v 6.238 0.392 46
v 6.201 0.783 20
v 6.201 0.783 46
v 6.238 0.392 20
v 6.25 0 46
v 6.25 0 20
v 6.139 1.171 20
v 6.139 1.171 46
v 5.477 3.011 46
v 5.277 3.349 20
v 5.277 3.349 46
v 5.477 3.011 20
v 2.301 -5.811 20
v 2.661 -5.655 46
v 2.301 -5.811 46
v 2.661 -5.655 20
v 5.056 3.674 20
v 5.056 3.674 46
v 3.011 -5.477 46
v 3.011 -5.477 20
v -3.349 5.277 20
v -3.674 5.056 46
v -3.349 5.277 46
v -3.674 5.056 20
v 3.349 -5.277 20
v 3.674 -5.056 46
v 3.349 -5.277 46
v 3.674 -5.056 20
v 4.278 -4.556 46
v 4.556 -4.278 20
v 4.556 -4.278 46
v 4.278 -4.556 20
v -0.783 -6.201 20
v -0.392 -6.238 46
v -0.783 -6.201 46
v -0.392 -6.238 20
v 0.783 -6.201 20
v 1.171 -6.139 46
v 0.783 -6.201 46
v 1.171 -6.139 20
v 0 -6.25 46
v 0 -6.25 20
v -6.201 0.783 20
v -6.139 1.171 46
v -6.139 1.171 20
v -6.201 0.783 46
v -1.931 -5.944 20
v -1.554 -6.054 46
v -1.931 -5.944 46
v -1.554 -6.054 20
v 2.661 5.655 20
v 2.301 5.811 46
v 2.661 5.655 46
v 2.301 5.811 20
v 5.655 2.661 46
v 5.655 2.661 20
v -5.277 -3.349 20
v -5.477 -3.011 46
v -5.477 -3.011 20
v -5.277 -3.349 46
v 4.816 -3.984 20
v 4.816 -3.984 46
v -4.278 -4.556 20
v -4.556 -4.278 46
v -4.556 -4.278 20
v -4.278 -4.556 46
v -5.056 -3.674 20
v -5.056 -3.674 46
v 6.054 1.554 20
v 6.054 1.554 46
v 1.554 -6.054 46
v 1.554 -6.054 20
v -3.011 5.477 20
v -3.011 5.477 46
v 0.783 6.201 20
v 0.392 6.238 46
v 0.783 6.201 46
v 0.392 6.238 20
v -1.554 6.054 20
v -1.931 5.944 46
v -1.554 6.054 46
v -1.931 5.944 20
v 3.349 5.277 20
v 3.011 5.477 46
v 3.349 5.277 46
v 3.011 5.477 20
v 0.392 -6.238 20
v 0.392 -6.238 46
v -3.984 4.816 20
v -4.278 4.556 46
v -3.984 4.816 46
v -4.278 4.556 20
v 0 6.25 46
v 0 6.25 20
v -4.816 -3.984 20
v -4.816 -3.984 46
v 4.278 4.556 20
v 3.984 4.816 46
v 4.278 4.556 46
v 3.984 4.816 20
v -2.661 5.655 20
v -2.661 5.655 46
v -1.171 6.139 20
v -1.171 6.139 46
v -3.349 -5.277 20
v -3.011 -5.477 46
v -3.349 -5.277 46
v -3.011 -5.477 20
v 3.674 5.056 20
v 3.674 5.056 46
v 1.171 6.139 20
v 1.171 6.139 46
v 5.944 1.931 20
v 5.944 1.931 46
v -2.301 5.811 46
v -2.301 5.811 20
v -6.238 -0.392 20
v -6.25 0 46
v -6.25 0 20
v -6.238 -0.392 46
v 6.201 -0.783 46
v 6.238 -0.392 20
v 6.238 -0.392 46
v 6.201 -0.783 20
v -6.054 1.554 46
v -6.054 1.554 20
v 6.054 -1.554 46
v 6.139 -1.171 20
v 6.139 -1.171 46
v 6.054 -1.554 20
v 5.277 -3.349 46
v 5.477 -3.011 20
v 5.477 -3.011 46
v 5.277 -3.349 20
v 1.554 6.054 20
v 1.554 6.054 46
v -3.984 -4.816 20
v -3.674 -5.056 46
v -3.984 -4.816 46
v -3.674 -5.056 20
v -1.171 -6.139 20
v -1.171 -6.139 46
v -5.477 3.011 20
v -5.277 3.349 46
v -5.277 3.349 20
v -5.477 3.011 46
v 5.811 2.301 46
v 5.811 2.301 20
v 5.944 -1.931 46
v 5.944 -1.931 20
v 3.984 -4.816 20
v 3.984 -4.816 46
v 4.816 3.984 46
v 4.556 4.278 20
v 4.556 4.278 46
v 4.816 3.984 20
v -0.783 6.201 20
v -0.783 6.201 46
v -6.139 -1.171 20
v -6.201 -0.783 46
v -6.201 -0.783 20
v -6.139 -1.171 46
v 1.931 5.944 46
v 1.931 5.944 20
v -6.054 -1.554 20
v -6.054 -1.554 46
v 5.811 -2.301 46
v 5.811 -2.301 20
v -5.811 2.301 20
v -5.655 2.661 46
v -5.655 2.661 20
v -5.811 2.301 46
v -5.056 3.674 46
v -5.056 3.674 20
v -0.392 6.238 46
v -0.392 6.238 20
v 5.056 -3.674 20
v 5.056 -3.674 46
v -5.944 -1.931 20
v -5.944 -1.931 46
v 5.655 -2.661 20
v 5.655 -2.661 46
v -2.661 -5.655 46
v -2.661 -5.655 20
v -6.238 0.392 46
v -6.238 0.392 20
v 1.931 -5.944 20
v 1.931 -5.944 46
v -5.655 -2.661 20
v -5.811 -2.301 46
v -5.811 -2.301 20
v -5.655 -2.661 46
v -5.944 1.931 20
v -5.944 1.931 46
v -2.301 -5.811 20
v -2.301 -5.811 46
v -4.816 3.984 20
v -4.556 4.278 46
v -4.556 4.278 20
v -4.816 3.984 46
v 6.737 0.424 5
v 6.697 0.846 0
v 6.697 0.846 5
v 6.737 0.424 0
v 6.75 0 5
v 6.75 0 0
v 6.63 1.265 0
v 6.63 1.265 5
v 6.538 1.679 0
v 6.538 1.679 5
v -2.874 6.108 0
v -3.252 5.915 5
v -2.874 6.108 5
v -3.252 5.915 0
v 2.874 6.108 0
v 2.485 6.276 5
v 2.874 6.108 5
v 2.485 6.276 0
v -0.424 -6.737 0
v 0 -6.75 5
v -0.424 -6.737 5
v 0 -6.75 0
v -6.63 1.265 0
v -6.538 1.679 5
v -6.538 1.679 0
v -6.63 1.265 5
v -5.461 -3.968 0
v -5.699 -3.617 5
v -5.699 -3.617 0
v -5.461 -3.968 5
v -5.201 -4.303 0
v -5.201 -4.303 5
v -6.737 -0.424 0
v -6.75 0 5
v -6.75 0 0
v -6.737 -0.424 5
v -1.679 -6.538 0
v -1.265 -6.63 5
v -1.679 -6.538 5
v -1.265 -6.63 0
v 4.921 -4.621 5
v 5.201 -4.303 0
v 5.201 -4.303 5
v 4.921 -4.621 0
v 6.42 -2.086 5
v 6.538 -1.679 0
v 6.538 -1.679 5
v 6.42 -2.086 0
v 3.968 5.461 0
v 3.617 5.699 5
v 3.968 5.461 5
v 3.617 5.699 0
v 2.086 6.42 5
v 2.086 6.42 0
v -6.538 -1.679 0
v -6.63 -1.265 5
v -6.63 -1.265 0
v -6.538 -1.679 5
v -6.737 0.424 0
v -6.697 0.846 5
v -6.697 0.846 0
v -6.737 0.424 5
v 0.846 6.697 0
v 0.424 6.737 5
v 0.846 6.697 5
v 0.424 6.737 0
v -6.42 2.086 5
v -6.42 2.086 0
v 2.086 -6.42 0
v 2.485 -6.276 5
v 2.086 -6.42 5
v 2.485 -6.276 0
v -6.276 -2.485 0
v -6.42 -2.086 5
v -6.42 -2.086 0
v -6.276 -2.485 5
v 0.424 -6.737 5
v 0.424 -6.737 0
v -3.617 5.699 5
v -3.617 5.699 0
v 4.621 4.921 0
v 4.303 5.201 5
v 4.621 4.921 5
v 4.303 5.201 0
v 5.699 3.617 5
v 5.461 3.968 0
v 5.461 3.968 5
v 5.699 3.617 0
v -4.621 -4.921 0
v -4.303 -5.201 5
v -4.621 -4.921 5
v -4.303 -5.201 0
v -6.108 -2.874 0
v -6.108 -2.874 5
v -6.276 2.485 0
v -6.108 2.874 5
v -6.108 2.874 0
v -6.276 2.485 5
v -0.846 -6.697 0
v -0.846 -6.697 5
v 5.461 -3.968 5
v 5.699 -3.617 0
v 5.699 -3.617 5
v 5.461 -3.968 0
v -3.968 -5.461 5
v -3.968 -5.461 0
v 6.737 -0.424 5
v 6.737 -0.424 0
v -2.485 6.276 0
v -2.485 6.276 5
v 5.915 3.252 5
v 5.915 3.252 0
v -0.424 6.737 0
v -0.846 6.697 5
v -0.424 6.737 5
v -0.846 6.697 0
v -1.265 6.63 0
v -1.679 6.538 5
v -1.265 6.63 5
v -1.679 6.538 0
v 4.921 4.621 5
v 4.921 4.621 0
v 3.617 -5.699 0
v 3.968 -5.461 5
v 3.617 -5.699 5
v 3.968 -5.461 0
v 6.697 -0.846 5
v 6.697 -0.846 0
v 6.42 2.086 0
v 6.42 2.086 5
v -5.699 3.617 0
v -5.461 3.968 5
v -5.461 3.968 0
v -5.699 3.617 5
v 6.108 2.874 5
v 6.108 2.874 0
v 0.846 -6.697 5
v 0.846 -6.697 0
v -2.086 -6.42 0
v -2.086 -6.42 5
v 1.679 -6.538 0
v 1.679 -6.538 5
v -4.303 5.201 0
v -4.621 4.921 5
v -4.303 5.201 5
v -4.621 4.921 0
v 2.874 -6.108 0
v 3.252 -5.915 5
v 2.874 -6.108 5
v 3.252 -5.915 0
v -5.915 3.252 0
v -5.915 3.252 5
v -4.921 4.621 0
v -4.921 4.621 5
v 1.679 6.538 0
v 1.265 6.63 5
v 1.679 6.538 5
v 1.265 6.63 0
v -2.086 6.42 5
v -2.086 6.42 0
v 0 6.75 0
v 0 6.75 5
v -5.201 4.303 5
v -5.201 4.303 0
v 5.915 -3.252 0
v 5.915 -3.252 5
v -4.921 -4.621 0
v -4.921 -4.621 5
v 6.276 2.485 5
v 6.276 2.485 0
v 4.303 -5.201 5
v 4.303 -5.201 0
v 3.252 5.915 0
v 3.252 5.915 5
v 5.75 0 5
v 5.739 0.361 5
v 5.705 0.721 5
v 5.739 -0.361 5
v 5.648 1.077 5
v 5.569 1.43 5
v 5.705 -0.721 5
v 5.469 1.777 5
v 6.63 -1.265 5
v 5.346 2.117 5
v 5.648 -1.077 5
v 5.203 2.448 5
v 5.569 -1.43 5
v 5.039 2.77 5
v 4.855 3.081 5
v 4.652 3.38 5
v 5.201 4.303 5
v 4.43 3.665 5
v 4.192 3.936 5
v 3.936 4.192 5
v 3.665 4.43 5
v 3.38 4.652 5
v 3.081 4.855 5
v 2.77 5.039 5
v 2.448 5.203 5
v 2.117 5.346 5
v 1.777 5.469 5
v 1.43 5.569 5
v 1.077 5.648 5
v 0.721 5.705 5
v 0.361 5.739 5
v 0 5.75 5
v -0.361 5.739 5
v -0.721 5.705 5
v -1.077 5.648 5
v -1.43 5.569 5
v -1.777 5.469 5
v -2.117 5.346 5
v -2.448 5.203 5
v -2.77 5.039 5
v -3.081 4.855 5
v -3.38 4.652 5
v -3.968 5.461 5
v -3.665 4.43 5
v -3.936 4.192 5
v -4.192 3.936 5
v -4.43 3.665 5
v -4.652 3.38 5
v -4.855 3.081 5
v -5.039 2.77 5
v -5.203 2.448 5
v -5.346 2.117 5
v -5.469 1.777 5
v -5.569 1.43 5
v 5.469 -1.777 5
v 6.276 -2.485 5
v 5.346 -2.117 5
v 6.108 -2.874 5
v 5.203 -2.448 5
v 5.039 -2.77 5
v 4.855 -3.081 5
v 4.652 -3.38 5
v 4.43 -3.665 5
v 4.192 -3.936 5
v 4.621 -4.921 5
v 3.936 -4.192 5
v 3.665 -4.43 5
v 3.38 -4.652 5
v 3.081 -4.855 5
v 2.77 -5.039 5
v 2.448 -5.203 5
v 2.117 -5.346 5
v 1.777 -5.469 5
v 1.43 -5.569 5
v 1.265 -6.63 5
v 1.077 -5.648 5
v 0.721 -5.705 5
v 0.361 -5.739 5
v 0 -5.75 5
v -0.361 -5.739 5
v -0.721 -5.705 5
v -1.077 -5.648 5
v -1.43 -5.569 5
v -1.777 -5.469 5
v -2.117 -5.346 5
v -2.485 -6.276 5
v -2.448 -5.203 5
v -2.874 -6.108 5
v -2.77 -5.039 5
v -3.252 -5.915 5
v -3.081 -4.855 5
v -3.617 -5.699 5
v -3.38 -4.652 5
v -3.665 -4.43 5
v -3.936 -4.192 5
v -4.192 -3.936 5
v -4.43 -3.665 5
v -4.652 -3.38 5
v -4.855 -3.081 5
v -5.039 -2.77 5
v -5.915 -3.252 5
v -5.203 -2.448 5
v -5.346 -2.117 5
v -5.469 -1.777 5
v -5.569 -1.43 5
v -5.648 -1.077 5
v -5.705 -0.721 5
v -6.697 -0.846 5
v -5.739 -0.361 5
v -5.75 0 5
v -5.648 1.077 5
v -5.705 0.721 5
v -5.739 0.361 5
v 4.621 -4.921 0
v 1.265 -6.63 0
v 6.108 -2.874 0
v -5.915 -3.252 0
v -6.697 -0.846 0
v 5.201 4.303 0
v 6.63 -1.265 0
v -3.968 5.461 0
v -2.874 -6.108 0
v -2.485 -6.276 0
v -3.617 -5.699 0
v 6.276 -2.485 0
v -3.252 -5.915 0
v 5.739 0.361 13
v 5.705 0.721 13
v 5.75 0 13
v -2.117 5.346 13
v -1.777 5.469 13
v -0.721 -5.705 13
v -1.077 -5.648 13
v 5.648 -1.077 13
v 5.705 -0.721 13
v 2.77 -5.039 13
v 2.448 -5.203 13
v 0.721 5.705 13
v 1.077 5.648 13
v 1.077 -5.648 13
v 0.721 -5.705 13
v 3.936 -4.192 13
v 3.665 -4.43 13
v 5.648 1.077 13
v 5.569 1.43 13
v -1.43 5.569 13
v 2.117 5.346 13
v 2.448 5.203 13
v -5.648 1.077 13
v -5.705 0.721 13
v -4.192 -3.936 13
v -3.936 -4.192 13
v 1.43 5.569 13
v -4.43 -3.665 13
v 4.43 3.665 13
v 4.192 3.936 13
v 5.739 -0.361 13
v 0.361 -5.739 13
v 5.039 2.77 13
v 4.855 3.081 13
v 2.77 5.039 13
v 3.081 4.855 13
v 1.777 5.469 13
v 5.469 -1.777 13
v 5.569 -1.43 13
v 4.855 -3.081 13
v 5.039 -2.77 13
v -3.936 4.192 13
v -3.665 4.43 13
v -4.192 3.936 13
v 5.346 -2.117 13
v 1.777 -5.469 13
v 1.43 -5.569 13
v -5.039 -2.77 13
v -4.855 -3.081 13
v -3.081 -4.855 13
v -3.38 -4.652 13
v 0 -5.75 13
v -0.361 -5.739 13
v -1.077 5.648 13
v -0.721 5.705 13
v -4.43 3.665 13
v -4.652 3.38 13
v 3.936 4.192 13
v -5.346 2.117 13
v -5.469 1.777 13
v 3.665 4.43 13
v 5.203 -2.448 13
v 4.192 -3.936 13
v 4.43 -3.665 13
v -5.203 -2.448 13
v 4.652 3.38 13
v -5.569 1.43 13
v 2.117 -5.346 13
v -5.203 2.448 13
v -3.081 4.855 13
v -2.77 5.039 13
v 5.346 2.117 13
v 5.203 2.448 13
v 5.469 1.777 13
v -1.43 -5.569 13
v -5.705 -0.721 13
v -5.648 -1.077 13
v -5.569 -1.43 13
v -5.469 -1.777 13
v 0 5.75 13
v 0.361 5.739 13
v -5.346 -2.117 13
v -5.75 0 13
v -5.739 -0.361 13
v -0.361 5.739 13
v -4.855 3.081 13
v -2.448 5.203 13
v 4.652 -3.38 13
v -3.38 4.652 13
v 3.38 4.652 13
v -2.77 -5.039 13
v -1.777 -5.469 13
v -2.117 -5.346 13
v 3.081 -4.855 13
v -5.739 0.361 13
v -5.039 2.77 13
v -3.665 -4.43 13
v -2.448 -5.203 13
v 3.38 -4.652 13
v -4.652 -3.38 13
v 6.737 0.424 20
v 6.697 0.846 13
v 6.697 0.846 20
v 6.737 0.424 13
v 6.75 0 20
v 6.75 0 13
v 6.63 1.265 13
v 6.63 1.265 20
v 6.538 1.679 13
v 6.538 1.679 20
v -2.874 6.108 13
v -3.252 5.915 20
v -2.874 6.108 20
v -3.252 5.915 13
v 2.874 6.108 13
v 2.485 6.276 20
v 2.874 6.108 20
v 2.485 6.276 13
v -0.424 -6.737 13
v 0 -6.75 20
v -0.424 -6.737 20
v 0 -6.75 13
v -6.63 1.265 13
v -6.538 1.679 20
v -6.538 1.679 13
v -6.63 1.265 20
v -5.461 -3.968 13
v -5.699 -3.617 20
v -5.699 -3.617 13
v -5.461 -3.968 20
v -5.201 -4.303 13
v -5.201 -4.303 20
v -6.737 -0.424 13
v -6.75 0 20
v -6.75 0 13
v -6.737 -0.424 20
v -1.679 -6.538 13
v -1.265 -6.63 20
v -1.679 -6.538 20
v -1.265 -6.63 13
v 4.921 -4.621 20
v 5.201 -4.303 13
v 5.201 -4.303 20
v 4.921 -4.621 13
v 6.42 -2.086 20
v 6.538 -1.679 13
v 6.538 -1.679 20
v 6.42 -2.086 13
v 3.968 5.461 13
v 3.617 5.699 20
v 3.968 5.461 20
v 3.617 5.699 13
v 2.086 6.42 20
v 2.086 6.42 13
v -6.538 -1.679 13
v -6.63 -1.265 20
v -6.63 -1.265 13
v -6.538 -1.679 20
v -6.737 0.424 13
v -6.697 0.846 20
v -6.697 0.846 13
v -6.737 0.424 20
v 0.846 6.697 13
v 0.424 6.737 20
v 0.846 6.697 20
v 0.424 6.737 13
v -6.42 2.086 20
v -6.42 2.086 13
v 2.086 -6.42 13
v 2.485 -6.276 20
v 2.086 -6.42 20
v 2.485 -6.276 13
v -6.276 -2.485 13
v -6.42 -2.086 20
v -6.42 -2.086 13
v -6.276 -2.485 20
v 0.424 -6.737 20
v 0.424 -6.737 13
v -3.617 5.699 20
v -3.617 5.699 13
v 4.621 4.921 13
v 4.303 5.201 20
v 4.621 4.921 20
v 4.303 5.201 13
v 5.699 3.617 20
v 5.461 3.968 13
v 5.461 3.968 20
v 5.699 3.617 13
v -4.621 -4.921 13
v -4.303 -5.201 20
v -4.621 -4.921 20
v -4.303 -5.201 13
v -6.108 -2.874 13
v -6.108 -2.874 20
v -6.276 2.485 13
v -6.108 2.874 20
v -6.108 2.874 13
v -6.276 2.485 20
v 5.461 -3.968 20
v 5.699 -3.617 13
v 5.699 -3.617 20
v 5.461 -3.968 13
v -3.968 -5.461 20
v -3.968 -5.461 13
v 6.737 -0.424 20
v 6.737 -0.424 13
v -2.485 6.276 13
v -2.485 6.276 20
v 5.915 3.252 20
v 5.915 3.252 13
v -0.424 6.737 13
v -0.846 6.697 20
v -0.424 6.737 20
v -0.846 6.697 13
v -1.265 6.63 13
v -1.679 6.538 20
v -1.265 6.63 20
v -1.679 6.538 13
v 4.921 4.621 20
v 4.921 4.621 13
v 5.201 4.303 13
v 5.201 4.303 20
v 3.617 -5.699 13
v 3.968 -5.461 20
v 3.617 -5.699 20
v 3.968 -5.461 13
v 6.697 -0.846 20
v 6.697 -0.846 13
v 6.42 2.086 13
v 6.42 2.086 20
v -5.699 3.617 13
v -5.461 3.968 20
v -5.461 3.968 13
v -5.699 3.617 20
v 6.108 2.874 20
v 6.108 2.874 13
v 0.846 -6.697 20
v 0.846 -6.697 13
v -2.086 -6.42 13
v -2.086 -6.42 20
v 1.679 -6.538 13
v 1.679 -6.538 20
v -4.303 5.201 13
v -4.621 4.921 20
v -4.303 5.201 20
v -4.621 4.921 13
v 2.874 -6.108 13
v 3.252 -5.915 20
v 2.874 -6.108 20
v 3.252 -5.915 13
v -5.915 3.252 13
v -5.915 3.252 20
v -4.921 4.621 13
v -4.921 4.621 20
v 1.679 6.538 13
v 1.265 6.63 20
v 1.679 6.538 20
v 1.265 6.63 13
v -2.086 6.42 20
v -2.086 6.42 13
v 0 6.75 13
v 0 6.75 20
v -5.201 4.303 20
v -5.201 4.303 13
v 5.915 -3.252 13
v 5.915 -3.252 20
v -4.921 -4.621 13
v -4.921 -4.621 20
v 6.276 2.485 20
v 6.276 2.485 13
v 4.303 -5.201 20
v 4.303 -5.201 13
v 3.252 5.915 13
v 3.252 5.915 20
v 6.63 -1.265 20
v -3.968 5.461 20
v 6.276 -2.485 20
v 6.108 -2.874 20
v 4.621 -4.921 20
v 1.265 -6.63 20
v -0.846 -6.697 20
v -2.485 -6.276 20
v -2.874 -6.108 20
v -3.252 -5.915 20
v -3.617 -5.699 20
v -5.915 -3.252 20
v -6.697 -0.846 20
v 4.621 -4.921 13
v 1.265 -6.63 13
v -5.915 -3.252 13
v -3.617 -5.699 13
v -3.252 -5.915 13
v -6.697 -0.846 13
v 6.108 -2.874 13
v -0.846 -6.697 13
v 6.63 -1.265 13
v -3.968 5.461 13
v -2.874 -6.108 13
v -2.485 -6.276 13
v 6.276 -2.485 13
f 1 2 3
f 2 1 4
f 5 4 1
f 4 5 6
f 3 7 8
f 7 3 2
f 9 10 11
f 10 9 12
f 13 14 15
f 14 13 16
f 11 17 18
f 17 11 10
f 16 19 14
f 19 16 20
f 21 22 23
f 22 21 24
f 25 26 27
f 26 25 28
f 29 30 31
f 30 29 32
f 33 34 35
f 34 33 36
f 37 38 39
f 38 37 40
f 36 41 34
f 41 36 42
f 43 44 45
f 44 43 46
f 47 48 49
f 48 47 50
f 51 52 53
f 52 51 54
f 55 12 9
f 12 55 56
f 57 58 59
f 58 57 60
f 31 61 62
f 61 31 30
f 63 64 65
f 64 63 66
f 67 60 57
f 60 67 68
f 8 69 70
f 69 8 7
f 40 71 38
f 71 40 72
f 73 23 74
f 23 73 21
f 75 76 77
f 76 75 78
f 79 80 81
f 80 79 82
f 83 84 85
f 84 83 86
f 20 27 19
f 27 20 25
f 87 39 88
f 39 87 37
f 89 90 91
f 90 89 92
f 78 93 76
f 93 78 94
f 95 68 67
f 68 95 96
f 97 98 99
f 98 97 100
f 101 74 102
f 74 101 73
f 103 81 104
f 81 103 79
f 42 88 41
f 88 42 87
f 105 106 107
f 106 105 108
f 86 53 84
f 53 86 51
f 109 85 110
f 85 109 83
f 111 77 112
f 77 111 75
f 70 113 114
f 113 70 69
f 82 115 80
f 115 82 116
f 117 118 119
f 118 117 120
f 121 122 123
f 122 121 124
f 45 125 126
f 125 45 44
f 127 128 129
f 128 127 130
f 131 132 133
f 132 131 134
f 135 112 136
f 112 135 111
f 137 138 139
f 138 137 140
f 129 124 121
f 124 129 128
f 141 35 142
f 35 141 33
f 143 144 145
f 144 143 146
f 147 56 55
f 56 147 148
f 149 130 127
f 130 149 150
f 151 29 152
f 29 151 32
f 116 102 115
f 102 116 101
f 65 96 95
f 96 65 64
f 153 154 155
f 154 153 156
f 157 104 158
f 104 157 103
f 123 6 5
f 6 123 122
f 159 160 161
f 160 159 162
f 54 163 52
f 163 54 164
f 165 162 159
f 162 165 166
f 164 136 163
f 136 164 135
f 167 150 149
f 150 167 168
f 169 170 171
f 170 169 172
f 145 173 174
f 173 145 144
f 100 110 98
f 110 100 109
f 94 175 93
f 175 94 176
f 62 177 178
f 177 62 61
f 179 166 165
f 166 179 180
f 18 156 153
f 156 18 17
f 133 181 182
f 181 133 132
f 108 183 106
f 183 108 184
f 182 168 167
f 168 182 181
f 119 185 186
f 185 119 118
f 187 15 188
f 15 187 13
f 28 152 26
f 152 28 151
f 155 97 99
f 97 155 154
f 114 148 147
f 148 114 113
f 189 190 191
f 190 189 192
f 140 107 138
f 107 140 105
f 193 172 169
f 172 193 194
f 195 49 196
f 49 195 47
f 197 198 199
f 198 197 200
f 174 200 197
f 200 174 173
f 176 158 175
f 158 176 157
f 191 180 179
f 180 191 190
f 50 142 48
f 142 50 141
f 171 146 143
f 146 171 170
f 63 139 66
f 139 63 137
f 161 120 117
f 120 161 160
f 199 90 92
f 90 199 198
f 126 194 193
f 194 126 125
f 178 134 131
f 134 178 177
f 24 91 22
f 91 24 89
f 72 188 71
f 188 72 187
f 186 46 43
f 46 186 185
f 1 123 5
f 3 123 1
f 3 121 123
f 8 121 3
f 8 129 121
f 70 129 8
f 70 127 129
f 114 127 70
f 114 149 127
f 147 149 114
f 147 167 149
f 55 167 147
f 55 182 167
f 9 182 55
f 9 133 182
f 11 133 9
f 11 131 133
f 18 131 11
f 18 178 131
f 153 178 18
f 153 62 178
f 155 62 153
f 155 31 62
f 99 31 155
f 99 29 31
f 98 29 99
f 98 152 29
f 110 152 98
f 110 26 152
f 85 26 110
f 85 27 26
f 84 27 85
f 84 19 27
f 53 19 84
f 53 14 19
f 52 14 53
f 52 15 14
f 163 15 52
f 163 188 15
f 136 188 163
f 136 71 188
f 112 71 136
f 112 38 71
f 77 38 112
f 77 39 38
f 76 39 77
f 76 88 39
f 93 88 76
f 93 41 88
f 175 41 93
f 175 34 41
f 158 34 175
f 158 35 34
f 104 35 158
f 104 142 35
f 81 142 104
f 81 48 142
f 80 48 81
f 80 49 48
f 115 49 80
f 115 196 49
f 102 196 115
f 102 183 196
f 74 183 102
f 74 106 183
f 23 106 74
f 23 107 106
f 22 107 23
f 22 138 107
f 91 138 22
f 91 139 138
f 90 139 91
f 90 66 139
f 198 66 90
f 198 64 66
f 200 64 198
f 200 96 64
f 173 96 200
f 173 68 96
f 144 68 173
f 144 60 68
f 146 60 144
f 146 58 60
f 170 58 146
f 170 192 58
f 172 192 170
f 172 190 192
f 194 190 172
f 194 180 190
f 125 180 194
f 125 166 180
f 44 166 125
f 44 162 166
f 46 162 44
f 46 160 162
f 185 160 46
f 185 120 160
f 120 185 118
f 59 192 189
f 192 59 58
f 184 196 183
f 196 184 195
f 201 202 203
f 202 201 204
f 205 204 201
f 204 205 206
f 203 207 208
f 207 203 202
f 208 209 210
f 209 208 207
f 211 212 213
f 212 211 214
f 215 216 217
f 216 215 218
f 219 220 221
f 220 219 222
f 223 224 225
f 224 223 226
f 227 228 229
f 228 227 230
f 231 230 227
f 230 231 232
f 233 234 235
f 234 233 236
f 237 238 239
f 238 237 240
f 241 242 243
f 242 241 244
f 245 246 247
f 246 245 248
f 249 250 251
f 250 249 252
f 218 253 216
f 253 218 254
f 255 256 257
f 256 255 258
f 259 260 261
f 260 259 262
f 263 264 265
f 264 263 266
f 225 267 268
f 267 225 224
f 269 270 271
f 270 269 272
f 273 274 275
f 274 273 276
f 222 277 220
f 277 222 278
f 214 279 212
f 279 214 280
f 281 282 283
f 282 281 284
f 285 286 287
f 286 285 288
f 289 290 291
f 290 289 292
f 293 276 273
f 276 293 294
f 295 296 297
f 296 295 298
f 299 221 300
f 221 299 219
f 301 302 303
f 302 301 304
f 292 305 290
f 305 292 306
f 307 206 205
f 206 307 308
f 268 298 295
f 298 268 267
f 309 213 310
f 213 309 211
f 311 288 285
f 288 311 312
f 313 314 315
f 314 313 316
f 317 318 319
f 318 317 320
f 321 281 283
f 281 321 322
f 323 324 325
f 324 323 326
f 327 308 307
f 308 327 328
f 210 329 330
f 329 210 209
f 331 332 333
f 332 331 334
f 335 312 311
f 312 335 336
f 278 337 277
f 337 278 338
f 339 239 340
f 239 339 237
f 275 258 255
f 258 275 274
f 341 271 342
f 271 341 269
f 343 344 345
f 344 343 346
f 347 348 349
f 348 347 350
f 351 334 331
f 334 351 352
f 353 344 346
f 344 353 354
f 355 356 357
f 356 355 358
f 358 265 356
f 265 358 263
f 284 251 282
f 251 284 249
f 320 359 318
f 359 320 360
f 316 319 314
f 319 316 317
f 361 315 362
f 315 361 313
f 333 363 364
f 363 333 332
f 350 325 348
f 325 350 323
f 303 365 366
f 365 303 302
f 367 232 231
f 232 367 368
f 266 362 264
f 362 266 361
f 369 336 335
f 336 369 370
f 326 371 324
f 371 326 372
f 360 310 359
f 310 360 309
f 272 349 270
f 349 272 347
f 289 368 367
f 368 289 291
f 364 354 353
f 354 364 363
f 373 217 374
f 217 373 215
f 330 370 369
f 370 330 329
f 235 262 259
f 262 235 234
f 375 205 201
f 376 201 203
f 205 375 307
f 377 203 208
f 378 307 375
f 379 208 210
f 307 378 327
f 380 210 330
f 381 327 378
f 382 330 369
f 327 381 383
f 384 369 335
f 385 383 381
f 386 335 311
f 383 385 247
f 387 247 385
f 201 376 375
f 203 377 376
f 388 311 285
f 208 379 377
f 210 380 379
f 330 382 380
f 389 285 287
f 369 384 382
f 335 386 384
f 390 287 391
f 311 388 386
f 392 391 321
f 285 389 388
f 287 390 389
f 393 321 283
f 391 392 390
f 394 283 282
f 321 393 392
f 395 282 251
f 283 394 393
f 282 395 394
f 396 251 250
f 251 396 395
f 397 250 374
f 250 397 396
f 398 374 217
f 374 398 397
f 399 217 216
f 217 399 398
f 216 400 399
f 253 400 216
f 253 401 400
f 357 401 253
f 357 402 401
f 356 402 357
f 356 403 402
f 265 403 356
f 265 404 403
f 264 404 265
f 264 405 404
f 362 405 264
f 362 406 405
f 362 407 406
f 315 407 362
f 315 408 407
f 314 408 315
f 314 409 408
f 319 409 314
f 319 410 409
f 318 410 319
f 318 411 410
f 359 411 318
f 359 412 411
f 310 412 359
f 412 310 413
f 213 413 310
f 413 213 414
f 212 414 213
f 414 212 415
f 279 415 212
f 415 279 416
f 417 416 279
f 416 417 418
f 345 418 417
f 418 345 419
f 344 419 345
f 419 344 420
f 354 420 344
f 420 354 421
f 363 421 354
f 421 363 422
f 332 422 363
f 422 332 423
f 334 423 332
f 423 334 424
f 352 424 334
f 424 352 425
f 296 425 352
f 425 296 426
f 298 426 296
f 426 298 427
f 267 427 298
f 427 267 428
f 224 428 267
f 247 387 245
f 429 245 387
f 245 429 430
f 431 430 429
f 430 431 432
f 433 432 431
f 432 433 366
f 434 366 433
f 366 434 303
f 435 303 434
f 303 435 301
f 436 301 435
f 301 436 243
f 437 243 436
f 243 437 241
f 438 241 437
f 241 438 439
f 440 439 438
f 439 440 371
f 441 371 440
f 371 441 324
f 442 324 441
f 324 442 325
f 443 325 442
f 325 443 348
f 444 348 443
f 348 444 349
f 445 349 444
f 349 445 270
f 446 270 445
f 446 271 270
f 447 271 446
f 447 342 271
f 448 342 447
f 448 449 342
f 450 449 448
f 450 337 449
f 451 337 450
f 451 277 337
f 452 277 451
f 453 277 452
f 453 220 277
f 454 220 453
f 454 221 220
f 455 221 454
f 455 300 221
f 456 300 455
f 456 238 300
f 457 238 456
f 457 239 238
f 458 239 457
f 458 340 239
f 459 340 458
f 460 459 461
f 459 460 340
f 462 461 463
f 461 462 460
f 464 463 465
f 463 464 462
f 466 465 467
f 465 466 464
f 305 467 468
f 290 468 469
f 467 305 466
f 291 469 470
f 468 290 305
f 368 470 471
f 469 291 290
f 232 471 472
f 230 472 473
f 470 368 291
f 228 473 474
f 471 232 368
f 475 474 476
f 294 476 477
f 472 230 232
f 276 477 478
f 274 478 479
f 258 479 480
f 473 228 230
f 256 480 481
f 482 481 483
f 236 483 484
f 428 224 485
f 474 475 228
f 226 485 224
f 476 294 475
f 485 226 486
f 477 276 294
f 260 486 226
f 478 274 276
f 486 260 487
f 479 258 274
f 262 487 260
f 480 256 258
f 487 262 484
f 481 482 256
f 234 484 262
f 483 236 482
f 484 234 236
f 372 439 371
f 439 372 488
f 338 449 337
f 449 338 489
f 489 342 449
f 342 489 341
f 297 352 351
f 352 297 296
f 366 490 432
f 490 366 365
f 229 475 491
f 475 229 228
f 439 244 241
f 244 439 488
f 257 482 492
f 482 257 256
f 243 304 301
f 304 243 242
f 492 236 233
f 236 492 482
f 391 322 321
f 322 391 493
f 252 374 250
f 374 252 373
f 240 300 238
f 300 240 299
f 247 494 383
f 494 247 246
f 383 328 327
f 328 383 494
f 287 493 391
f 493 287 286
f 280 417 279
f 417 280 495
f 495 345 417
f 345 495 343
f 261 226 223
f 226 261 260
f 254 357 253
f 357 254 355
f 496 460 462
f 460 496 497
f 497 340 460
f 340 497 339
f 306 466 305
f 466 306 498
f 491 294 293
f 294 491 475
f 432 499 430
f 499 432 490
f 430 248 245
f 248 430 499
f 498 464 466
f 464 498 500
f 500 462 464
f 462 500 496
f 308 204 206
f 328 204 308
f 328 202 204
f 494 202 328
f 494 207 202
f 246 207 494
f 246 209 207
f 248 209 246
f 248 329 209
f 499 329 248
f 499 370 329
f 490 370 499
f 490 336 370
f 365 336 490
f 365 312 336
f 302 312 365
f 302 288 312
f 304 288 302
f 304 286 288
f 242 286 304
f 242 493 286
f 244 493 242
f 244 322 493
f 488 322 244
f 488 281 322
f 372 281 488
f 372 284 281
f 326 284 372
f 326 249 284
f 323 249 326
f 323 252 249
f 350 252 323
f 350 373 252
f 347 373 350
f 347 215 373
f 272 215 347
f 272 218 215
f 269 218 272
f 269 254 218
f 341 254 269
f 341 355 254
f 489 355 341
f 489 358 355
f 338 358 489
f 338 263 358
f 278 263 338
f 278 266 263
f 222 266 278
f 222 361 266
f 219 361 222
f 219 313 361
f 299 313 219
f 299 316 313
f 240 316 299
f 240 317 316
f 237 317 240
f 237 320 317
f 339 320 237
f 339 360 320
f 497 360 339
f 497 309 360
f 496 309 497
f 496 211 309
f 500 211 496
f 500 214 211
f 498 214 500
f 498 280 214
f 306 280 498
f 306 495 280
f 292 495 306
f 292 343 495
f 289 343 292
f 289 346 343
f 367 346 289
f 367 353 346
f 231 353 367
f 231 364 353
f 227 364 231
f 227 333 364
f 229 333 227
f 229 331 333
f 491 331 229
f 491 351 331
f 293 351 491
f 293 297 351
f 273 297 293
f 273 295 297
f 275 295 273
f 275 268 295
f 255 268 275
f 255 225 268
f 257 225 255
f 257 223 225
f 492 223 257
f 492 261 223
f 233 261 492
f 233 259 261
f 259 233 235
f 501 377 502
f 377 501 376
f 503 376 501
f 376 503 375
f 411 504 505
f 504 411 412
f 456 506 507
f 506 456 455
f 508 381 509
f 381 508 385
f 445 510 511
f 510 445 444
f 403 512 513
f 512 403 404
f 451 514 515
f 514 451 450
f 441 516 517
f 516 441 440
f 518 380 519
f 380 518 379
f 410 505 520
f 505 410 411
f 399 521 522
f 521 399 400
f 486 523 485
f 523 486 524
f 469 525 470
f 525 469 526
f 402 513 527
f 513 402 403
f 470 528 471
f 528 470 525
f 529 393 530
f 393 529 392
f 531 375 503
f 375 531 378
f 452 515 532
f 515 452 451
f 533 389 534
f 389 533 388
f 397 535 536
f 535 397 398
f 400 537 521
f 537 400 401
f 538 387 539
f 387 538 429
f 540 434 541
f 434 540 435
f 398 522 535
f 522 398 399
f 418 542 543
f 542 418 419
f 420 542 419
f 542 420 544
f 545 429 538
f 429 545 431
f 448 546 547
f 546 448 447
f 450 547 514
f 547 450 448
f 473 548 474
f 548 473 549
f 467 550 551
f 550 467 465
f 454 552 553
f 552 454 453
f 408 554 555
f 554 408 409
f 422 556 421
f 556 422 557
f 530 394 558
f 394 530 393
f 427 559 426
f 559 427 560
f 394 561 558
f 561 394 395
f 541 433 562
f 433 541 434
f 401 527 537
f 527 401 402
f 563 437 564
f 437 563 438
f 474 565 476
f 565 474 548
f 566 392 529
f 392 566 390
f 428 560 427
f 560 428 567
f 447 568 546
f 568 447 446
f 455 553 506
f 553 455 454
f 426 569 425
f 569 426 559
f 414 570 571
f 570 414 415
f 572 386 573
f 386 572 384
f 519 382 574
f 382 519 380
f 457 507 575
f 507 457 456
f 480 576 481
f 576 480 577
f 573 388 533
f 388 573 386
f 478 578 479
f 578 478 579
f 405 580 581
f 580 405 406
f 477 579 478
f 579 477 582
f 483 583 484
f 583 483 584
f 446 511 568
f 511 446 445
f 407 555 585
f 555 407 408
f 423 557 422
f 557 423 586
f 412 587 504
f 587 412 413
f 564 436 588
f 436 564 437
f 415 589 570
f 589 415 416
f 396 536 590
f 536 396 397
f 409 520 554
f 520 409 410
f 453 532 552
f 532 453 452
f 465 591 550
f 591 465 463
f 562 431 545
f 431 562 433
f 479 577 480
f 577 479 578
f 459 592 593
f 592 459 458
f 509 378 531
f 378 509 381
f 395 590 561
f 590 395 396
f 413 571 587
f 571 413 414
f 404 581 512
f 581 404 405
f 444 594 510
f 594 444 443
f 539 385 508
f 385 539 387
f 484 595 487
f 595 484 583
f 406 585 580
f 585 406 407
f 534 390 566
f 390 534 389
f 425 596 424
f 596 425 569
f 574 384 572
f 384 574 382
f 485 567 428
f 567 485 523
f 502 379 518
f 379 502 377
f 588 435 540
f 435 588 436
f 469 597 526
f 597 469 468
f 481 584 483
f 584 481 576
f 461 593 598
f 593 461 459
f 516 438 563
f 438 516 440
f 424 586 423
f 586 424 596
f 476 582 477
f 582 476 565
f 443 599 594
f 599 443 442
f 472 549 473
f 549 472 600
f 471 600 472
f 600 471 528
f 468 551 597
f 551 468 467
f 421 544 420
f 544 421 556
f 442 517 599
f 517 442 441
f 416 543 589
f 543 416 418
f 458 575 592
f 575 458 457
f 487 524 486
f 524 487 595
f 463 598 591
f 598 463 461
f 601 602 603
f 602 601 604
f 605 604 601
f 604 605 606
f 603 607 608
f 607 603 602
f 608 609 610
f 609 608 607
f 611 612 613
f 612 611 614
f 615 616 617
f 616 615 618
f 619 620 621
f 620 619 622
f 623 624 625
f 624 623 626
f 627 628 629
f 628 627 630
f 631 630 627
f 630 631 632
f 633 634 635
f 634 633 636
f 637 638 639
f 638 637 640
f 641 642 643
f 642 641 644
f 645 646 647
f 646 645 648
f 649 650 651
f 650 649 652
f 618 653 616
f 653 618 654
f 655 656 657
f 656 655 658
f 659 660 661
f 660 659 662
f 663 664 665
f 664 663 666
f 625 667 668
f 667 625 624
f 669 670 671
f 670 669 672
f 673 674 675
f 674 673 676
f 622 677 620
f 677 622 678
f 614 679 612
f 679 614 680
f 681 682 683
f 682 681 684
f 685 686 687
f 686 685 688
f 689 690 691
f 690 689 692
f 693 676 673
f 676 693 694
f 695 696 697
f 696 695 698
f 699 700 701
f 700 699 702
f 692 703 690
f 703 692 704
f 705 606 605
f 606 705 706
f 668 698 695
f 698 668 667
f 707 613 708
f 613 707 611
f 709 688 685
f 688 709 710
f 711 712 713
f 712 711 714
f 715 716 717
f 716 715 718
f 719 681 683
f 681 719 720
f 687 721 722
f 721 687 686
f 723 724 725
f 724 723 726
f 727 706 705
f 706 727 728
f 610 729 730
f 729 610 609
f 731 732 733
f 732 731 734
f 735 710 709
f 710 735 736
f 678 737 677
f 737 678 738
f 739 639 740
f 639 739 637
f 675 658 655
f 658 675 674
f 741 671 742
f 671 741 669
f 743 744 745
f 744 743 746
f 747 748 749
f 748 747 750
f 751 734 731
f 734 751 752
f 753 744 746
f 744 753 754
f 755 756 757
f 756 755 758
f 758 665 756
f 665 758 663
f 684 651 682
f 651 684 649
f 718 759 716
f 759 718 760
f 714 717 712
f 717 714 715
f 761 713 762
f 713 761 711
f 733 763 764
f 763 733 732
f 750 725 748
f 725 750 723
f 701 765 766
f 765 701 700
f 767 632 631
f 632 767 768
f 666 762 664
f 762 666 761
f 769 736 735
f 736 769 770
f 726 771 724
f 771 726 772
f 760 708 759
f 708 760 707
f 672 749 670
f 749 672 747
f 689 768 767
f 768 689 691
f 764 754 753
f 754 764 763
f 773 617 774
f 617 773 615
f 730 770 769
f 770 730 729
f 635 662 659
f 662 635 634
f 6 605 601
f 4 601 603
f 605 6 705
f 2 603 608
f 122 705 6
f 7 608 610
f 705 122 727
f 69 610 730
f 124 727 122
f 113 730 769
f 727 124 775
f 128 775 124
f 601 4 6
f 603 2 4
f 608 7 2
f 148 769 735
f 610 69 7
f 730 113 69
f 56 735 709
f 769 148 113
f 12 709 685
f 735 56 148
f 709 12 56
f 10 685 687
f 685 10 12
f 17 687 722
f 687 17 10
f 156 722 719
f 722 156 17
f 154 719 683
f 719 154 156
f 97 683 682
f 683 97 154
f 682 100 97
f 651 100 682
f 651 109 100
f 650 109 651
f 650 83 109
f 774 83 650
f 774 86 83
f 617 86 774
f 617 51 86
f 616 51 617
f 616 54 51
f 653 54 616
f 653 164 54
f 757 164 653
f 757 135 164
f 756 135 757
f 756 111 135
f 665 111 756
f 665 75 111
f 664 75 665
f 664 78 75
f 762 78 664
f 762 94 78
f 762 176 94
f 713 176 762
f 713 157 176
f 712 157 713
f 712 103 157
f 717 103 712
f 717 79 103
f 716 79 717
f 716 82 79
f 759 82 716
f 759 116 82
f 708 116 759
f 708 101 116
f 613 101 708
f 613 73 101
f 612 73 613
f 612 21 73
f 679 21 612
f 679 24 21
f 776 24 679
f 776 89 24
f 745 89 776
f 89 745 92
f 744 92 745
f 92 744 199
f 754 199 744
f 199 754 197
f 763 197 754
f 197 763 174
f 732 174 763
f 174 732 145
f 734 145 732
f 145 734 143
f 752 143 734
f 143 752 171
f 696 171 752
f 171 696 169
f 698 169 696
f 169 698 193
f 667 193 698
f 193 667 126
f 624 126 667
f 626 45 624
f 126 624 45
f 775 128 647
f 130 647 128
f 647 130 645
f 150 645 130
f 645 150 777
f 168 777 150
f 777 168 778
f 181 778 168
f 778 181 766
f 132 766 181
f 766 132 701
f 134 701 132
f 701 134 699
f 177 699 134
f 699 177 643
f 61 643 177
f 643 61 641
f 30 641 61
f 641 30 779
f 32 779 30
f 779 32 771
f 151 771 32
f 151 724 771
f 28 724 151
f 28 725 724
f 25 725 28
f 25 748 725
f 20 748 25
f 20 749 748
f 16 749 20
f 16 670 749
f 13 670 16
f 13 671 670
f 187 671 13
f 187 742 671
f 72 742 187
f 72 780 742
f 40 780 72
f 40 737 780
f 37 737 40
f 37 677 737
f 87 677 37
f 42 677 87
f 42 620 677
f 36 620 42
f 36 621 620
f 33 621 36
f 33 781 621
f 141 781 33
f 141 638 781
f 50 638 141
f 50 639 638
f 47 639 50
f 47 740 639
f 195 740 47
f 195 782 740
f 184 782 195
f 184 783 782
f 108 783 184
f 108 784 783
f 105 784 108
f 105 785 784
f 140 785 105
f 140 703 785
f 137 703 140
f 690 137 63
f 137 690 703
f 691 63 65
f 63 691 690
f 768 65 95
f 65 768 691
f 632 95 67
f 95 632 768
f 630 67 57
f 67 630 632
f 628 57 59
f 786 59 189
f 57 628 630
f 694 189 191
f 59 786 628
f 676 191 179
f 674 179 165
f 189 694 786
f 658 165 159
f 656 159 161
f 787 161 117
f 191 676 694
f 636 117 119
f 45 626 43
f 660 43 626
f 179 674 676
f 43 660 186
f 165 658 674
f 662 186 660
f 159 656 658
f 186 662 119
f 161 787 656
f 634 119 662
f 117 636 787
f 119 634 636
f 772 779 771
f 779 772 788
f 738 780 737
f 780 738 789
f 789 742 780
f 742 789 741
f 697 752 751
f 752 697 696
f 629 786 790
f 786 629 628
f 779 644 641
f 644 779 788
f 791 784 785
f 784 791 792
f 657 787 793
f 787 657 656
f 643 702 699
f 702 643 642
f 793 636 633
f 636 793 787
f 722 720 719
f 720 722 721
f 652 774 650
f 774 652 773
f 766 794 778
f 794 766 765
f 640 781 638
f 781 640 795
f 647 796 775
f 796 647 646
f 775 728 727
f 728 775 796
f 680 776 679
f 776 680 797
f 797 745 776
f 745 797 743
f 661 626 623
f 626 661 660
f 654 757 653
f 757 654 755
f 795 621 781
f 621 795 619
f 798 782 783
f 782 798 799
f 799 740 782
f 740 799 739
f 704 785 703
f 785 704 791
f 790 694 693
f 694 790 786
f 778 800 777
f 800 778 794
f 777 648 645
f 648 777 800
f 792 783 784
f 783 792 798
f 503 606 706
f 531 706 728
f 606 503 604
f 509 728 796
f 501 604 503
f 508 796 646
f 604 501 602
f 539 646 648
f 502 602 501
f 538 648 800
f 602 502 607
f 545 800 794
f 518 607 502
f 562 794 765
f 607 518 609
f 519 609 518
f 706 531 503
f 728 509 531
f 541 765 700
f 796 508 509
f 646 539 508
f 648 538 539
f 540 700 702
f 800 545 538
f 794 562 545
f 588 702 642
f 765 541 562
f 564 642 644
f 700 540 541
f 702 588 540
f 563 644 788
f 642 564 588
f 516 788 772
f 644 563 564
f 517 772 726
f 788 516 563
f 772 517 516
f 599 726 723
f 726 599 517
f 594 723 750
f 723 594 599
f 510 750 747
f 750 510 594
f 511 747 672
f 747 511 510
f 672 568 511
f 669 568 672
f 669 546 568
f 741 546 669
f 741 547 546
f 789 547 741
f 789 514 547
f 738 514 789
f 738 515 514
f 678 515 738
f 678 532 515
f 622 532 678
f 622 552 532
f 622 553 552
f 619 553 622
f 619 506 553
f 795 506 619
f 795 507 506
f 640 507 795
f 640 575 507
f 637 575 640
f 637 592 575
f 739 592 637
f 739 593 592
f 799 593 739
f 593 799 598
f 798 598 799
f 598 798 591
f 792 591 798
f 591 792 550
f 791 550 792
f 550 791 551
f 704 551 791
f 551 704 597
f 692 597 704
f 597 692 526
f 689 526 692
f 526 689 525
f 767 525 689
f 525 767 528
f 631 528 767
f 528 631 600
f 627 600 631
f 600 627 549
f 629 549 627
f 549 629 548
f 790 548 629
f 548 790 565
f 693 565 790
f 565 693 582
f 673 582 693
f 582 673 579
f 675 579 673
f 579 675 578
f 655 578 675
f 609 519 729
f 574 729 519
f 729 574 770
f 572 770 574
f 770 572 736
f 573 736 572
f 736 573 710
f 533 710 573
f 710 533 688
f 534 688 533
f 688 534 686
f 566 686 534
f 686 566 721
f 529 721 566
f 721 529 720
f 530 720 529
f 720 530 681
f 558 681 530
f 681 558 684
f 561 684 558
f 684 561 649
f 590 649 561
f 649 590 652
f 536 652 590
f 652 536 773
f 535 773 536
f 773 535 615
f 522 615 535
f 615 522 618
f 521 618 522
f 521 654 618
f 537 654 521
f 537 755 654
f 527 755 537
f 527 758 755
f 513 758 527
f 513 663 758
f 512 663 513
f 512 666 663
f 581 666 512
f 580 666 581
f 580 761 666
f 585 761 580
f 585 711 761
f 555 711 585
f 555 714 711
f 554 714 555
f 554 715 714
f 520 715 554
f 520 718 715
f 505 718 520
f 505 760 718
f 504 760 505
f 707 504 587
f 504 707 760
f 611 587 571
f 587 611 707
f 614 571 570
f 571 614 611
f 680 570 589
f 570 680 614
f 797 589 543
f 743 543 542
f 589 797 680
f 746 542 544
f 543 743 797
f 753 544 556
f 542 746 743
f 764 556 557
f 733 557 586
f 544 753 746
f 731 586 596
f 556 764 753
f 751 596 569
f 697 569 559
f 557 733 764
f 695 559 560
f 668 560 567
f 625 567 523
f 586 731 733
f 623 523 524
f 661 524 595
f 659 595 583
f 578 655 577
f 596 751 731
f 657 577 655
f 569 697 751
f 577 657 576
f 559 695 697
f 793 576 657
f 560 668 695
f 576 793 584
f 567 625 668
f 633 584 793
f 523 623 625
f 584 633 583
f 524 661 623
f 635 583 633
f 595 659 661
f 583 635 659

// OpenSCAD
$fn= 100;

difference() {
%translate([0,0,0.1]) cylinder(d1=23, d2=20, h=30);
union() {
	translate([0,0,16]) cylinder(d=12.5, h=30);
	cylinder(d=13.5, h=5);
	cylinder(d=11.5, h=30);
	translate([0,0,13]) cylinder(d=13.5, h=7);
}
}
//translate([0,0,-12.2]) cylinder(d=23, h=12);
